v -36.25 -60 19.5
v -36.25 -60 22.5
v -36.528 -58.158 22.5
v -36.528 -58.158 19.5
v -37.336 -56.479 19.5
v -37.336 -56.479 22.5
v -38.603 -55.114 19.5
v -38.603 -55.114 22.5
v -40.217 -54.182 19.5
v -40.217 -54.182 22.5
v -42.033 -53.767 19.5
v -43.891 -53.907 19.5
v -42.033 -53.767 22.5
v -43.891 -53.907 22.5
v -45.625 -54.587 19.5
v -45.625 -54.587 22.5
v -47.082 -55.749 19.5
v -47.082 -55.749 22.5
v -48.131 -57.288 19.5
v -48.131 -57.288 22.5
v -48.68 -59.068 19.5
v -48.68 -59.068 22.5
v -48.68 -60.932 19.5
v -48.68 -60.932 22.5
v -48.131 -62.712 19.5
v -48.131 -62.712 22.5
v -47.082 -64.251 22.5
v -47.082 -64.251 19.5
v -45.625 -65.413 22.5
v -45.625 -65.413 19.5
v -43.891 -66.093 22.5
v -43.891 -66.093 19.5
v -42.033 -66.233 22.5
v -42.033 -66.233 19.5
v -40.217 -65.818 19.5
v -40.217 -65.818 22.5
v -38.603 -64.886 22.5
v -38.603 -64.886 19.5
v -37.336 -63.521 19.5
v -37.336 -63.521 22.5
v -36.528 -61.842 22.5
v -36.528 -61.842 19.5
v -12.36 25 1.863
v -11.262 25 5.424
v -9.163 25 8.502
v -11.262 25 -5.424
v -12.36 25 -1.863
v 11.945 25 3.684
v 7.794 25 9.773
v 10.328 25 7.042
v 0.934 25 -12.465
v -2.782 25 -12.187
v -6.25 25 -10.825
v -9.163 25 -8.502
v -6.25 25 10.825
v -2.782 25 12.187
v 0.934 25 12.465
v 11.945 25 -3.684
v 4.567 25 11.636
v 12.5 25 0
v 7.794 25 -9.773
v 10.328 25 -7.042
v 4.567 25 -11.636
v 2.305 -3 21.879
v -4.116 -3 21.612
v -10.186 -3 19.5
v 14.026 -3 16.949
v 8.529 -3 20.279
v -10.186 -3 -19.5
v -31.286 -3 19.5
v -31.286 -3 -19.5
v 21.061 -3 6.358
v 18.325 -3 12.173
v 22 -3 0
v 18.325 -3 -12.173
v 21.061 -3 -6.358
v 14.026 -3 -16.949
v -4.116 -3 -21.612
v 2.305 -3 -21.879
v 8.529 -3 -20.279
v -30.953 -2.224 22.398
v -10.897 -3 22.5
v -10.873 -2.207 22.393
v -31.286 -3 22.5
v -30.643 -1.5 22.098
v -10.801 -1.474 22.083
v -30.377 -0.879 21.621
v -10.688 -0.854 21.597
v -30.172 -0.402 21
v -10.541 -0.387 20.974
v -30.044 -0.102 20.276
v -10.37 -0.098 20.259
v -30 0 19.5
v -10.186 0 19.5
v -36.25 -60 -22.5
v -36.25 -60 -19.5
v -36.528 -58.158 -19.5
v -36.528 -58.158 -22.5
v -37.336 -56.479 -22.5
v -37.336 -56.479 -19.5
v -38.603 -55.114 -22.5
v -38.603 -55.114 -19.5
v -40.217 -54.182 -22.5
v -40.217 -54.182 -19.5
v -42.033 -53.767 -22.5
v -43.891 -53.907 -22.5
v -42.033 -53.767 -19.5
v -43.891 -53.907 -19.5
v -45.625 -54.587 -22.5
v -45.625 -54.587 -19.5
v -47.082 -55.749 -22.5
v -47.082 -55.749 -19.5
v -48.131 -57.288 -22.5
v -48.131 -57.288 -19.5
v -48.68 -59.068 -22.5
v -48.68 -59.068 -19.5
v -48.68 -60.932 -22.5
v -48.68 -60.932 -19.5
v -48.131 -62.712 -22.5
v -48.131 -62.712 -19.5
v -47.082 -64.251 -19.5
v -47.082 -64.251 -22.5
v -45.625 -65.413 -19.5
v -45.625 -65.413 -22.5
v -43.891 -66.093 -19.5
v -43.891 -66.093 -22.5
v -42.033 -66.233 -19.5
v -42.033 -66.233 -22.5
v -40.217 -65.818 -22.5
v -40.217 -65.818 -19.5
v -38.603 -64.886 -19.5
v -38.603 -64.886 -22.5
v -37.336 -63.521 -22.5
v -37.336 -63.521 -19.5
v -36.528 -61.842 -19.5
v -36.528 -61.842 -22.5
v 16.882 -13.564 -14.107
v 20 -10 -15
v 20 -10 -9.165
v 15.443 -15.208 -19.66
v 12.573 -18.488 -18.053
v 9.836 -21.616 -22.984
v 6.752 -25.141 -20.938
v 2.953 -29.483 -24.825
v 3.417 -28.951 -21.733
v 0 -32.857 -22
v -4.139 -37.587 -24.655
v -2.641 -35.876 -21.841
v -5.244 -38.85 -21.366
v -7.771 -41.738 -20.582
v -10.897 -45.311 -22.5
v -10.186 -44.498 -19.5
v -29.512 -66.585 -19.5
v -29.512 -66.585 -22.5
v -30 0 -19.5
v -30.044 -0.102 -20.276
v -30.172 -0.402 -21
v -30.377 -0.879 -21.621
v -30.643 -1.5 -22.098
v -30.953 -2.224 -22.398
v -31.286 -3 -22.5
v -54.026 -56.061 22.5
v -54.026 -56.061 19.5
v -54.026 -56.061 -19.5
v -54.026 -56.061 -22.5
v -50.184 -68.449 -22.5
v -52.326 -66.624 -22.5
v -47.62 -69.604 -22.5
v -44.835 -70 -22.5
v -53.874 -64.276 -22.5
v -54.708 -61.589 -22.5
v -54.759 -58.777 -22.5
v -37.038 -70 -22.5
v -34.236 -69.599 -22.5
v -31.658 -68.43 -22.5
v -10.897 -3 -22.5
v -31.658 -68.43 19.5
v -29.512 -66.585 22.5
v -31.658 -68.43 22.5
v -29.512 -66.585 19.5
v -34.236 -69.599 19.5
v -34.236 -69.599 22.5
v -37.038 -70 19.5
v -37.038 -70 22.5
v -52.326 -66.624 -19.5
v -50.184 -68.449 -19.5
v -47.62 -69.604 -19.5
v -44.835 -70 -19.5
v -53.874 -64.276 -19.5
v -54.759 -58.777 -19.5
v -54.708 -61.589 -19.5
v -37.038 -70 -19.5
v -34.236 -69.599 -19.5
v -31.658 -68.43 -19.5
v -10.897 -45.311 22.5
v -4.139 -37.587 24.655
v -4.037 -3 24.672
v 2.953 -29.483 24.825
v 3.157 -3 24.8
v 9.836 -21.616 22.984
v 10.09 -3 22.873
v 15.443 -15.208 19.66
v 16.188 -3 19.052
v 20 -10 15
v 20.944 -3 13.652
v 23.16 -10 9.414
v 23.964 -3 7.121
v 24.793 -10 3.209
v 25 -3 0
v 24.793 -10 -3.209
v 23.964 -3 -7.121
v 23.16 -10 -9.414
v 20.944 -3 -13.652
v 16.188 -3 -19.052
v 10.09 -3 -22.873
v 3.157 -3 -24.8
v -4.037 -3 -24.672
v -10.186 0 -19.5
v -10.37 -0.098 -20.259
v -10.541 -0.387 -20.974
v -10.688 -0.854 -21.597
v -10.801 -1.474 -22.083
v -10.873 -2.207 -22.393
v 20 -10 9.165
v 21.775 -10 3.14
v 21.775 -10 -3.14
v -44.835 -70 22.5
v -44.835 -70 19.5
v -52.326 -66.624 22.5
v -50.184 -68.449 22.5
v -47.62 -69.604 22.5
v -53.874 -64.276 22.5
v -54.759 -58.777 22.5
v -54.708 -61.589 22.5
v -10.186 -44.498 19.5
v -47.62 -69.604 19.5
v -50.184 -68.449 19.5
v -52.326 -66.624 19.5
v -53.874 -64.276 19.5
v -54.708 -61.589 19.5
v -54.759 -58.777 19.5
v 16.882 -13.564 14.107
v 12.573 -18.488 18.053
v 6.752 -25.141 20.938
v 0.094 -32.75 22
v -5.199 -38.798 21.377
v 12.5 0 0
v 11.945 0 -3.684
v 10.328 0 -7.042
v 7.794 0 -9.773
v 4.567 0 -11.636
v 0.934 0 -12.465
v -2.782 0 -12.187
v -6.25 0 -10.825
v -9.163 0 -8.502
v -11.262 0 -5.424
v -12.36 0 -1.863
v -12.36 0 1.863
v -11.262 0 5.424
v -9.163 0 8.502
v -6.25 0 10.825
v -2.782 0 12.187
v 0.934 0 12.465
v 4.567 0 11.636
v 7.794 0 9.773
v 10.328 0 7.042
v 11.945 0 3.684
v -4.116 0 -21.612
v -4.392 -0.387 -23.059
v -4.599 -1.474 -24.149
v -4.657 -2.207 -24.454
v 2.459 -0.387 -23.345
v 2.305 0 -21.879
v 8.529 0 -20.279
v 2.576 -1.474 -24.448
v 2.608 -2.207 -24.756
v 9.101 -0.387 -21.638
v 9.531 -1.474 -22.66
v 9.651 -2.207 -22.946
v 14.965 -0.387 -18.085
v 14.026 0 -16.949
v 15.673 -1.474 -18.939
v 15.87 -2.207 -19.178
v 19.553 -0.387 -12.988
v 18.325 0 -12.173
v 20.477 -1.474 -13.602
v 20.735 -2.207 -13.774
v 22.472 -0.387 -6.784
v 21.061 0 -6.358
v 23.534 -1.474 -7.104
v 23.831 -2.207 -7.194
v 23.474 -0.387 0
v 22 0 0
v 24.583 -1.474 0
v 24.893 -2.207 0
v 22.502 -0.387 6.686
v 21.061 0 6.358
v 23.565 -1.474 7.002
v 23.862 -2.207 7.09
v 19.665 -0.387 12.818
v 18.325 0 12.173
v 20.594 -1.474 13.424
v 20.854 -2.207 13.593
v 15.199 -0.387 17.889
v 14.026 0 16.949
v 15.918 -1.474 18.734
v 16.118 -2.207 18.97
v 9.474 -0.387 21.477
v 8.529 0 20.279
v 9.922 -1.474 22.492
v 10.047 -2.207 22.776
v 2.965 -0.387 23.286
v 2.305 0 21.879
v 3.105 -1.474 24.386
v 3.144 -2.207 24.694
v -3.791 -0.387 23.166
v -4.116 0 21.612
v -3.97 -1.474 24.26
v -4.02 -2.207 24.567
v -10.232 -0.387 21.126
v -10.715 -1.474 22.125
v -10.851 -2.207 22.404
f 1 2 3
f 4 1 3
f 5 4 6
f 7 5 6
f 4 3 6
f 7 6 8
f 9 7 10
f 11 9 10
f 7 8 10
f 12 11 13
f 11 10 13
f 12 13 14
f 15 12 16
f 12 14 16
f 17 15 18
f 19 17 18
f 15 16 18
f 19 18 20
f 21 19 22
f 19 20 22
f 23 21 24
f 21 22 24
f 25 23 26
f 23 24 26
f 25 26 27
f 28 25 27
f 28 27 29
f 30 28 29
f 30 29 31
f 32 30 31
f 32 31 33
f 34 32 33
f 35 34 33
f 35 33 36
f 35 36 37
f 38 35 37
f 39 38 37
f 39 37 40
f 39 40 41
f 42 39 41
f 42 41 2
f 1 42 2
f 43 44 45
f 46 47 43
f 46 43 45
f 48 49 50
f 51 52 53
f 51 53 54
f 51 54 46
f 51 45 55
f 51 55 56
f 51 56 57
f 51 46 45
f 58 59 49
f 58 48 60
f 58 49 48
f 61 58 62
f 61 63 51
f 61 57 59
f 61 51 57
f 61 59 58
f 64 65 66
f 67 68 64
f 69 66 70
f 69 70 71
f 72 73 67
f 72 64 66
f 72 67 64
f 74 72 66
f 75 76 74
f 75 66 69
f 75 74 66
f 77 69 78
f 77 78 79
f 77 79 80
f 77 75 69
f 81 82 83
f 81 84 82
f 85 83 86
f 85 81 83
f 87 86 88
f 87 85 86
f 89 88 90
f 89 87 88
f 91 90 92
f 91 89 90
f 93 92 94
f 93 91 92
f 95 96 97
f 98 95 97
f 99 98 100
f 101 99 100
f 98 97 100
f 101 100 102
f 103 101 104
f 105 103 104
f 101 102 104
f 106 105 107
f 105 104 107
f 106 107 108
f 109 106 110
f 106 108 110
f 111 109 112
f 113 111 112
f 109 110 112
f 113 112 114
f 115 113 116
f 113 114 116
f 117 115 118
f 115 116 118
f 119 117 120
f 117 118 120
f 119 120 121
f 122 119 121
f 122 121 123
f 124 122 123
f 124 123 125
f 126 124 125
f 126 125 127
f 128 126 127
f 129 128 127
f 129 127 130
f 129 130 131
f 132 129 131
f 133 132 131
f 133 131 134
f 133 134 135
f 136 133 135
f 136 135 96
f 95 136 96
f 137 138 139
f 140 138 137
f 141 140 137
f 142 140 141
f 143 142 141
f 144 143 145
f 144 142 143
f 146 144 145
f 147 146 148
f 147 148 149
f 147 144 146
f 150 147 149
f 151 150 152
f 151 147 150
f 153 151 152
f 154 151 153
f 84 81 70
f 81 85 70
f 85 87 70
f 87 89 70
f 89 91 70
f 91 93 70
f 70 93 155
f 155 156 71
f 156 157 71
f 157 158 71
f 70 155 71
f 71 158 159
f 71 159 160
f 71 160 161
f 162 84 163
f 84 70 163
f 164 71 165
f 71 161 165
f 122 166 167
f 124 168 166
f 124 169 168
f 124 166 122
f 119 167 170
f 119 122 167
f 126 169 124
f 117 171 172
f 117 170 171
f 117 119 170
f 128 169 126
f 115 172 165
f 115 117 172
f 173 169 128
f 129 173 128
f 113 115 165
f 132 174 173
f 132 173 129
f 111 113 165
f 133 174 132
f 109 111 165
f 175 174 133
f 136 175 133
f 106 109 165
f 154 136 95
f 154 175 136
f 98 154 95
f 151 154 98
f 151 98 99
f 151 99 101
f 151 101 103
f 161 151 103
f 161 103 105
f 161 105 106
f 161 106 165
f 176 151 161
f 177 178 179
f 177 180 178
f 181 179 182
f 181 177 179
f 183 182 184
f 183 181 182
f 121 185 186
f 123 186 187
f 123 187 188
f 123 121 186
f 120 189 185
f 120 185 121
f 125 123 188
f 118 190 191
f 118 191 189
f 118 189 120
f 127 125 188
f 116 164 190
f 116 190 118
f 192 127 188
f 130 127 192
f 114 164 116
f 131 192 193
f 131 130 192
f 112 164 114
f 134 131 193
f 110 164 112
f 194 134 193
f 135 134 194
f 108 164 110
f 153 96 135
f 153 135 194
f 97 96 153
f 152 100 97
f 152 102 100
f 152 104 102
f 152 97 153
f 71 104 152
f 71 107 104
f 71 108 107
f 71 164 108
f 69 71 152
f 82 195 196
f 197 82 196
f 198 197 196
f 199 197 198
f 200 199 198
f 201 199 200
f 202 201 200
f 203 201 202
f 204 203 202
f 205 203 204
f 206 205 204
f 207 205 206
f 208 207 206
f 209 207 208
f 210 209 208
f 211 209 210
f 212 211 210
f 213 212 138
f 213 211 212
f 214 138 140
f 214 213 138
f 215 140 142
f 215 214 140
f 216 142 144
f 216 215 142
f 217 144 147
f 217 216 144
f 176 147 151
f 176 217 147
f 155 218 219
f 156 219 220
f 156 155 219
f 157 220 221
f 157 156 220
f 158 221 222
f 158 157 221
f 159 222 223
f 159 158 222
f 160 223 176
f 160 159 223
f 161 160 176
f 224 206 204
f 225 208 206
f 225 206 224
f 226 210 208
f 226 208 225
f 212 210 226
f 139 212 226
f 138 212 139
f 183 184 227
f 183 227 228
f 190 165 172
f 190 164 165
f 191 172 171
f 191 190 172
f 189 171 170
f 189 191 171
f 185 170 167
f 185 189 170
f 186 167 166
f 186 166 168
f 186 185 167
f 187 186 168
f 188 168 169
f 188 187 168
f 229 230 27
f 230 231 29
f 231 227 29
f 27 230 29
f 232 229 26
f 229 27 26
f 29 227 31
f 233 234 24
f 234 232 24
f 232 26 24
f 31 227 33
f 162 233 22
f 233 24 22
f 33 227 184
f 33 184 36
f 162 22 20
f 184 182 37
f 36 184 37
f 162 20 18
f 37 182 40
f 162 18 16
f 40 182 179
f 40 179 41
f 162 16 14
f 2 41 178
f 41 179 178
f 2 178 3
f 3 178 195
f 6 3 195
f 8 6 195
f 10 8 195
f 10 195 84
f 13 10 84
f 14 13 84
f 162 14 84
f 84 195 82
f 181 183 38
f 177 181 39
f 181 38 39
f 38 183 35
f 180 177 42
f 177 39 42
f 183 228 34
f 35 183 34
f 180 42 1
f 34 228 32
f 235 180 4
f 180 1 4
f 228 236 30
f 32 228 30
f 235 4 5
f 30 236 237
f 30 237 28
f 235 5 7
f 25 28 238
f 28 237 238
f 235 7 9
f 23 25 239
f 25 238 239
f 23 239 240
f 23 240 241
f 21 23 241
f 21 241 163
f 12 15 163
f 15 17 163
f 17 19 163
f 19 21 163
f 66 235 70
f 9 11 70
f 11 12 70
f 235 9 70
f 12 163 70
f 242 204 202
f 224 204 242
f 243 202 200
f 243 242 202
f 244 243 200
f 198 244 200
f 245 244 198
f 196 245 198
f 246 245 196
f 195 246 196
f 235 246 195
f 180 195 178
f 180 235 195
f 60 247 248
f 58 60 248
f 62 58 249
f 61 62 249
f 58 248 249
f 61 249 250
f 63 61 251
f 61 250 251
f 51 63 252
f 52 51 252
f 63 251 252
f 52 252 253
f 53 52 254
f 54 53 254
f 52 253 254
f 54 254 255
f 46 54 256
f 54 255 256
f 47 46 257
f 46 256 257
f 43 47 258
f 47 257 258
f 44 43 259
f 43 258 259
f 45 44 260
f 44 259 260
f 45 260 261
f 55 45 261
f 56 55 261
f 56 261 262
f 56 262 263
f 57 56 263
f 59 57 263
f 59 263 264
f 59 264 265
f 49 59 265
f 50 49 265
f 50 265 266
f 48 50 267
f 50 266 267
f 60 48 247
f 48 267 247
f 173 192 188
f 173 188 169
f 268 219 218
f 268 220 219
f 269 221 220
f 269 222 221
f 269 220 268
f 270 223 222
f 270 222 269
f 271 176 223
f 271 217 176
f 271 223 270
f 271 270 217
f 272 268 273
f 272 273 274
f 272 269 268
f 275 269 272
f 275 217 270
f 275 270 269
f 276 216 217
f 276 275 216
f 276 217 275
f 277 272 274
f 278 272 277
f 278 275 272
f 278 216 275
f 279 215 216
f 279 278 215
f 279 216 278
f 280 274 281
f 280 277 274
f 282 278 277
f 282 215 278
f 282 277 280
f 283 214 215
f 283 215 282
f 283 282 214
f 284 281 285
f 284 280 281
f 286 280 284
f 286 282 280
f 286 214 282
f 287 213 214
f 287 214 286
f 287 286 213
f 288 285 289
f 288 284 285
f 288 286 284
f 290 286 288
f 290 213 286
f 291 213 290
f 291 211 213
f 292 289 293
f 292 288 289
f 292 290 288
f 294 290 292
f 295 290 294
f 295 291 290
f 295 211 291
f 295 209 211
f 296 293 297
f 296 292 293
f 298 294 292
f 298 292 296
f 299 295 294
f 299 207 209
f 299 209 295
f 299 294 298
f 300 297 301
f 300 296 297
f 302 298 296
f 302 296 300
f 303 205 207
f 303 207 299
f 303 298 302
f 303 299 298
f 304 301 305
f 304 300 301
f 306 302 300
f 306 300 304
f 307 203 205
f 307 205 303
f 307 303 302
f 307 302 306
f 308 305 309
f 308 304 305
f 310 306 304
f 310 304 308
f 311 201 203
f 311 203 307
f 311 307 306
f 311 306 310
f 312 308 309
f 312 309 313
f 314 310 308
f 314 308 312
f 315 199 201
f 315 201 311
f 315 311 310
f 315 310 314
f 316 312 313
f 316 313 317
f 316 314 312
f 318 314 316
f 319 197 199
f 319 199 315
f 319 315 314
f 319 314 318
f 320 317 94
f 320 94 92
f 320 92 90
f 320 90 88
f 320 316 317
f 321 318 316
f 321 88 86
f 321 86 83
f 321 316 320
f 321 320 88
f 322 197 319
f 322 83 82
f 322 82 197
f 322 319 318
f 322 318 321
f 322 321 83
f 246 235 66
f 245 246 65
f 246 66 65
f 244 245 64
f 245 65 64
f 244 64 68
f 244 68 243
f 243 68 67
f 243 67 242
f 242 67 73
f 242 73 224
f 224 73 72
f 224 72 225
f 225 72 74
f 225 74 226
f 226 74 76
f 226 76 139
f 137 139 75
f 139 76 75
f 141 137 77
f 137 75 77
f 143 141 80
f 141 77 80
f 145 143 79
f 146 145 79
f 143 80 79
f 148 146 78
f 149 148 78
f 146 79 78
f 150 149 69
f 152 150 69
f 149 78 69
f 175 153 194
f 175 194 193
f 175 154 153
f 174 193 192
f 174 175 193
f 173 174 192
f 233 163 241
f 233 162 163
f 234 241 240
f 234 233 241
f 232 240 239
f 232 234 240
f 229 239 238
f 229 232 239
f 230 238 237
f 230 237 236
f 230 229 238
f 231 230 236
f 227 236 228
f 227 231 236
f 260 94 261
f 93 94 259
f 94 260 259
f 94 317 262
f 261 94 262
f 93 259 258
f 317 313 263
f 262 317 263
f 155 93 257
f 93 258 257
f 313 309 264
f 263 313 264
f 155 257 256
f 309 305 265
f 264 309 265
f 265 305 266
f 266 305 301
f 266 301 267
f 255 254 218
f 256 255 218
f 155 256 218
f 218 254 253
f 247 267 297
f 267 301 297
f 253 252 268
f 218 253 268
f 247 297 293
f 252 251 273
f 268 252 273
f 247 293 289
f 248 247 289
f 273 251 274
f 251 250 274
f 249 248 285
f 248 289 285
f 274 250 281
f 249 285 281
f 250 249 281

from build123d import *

# Parameters (mm, degrees)
SKETCH2_R               = 25
SKETCH2_R_2             = 22
EXTRUDE_THIN1_DEPTH     = 60
SKETCH3_W               = 45
SKETCH3_H               = 70
SKETCH3_W_2             = 39
SKETCH3_H_2             = 64
EXTRUDE_THIN2_DEPTH     = 60
SKETCH4_R               = 22
CUT_EXTRUDE1_DEPTH      = 71
CUT_EXTRUDE2_DEPTH      = 26
CUT_EXTRUDE2_DEPTH_BACK = 26
SKETCH6_W               = 39
SKETCH6_H               = 64
CUT_EXTRUDE3_DEPTH      = 50
CUT_EXTRUDE4_DEPTH      = 26
CUT_EXTRUDE4_DEPTH_BACK = 26
SKETCH8_W               = 35
SKETCH8_H               = 39
CUT_EXTRUDE6_DEPTH      = 4
BOSS_EXTRUDE1_DEPTH     = 3
FILLET1_R               = 3
SKETCH10_R              = 6.25
CUT_EXTRUDE7_DEPTH      = 48.5000001
FILLET3_R               = 10
SKETCH11_R              = 12.5
BOSS_EXTRUDE2_DEPTH     = 25


with BuildPart() as part:
    # Sketch2 → Extrude-Thin1 (new body)
    with BuildSketch(Plane(origin=(0, 0, 0), x_dir=(1, 0, 0), z_dir=(0, 1, 0))):
        Circle(SKETCH2_R)
        Circle(SKETCH2_R_2, mode=Mode.SUBTRACT)
    extrude(amount=-EXTRUDE_THIN1_DEPTH)

    # Sketch3 → Extrude-Thin2 (add)
    with BuildSketch(Plane(origin=(0, 0, 0), x_dir=(0, 0, -1), z_dir=(1, 0, 0))):
        with Locations((0, -35)):
            Rectangle(SKETCH3_W, SKETCH3_H)
        with Locations((0, -35)):
            Rectangle(SKETCH3_W_2, SKETCH3_H_2, mode=Mode.SUBTRACT)
    extrude(amount=-EXTRUDE_THIN2_DEPTH)

    # Sketch4 → Cut-Extrude1 (cut, through all)
    with BuildSketch(Plane(origin=(0, 0, 0), x_dir=(1, 0, 0), z_dir=(0, 1, 0))):
        Circle(SKETCH4_R)
    extrude(amount=-CUT_EXTRUDE1_DEPTH, mode=Mode.SUBTRACT)

    # Sketch5 → Cut-Extrude2 (cut, two sides)
    with BuildSketch(Plane.XY) as cut_extrude2_sk:
        Polygon((20, -10), (-50, -90), (25, -90), (25, -10), align=None)
    extrude(amount=CUT_EXTRUDE2_DEPTH, mode=Mode.SUBTRACT)
    extrude(cut_extrude2_sk.sketch, amount=-CUT_EXTRUDE2_DEPTH_BACK, mode=Mode.SUBTRACT)

    # Sketch6 → Cut-Extrude3 (cut)
    with BuildSketch(Plane.ZY.offset(60)):
        with Locations((0, -35)):
            Rectangle(SKETCH6_W, SKETCH6_H)
    extrude(amount=-CUT_EXTRUDE3_DEPTH, mode=Mode.SUBTRACT)

    # Sketch7 → Cut-Extrude4 (cut, two sides)
    with BuildSketch(Plane.XY) as cut_extrude4_sk:
        Polygon((-30, 0), (-60, -70), (-60, 0), align=None)
    extrude(amount=CUT_EXTRUDE4_DEPTH, mode=Mode.SUBTRACT)
    extrude(cut_extrude4_sk.sketch, amount=-CUT_EXTRUDE4_DEPTH_BACK, mode=Mode.SUBTRACT)

    # Sketch8 → Cut-Extrude6 (cut, through all)
    with BuildSketch(Plane(origin=(0, -67, 0), x_dir=(1, 0, 0), z_dir=(0, 1, 0))):
        with Locations((-47.375, 0)):
            Rectangle(SKETCH8_W, SKETCH8_H)
    extrude(amount=-CUT_EXTRUDE6_DEPTH, mode=Mode.SUBTRACT)

    # Sketch9 → Boss-Extrude1 (add)
    with BuildSketch(Plane(origin=(0, 0, 0), x_dir=(1, 0, 0), z_dir=(0, 1, 0))):
        with BuildLine():
            Line((-30, 22.5), (-10.897247359, 22.5))
            ThreePointArc((-10.897247359, 22.5), (25, 0), (-10.897247359, -22.5))
            Line((-10.897247359, -22.5), (-30, -22.5))
            Line((-30, -22.5), (-30, 22.5))
        make_face()
    extrude(amount=-BOSS_EXTRUDE1_DEPTH)

    # Fillet1
    fillet1_edges = [part.edges().sort_by_distance(p)[0] for p in [
        (25, 0, 0),
        (-20.448623679, 0, -22.5),
        (-20.448623679, 0, 22.5),
    ]]
    fillet(fillet1_edges, radius=FILLET1_R)

    # Sketch10 → Cut-Extrude7 (cut, through all)
    with BuildSketch(Plane.XY.offset(22.5)):
        with Locations((-42.5, -60)):
            Circle(SKETCH10_R)
    extrude(amount=-CUT_EXTRUDE7_DEPTH, mode=Mode.SUBTRACT)

    # Fillet3
    fillet3_edges = [part.edges().sort_by_distance(p)[0] for p in [
        (-60, -70, -21),
        (-32.5, -70, -21),
        (-60, -70, 21),
        (-32.5, -70, 21),
    ]]
    fillet(fillet3_edges, radius=FILLET3_R)

    # Sketch11 → Boss-Extrude2 (add)
    with BuildSketch(Plane(origin=(0, 0, 0), x_dir=(1, 0, 0), z_dir=(0, 1, 0))):
        Circle(SKETCH11_R)
    extrude(amount=BOSS_EXTRUDE2_DEPTH)


solid = part.part
